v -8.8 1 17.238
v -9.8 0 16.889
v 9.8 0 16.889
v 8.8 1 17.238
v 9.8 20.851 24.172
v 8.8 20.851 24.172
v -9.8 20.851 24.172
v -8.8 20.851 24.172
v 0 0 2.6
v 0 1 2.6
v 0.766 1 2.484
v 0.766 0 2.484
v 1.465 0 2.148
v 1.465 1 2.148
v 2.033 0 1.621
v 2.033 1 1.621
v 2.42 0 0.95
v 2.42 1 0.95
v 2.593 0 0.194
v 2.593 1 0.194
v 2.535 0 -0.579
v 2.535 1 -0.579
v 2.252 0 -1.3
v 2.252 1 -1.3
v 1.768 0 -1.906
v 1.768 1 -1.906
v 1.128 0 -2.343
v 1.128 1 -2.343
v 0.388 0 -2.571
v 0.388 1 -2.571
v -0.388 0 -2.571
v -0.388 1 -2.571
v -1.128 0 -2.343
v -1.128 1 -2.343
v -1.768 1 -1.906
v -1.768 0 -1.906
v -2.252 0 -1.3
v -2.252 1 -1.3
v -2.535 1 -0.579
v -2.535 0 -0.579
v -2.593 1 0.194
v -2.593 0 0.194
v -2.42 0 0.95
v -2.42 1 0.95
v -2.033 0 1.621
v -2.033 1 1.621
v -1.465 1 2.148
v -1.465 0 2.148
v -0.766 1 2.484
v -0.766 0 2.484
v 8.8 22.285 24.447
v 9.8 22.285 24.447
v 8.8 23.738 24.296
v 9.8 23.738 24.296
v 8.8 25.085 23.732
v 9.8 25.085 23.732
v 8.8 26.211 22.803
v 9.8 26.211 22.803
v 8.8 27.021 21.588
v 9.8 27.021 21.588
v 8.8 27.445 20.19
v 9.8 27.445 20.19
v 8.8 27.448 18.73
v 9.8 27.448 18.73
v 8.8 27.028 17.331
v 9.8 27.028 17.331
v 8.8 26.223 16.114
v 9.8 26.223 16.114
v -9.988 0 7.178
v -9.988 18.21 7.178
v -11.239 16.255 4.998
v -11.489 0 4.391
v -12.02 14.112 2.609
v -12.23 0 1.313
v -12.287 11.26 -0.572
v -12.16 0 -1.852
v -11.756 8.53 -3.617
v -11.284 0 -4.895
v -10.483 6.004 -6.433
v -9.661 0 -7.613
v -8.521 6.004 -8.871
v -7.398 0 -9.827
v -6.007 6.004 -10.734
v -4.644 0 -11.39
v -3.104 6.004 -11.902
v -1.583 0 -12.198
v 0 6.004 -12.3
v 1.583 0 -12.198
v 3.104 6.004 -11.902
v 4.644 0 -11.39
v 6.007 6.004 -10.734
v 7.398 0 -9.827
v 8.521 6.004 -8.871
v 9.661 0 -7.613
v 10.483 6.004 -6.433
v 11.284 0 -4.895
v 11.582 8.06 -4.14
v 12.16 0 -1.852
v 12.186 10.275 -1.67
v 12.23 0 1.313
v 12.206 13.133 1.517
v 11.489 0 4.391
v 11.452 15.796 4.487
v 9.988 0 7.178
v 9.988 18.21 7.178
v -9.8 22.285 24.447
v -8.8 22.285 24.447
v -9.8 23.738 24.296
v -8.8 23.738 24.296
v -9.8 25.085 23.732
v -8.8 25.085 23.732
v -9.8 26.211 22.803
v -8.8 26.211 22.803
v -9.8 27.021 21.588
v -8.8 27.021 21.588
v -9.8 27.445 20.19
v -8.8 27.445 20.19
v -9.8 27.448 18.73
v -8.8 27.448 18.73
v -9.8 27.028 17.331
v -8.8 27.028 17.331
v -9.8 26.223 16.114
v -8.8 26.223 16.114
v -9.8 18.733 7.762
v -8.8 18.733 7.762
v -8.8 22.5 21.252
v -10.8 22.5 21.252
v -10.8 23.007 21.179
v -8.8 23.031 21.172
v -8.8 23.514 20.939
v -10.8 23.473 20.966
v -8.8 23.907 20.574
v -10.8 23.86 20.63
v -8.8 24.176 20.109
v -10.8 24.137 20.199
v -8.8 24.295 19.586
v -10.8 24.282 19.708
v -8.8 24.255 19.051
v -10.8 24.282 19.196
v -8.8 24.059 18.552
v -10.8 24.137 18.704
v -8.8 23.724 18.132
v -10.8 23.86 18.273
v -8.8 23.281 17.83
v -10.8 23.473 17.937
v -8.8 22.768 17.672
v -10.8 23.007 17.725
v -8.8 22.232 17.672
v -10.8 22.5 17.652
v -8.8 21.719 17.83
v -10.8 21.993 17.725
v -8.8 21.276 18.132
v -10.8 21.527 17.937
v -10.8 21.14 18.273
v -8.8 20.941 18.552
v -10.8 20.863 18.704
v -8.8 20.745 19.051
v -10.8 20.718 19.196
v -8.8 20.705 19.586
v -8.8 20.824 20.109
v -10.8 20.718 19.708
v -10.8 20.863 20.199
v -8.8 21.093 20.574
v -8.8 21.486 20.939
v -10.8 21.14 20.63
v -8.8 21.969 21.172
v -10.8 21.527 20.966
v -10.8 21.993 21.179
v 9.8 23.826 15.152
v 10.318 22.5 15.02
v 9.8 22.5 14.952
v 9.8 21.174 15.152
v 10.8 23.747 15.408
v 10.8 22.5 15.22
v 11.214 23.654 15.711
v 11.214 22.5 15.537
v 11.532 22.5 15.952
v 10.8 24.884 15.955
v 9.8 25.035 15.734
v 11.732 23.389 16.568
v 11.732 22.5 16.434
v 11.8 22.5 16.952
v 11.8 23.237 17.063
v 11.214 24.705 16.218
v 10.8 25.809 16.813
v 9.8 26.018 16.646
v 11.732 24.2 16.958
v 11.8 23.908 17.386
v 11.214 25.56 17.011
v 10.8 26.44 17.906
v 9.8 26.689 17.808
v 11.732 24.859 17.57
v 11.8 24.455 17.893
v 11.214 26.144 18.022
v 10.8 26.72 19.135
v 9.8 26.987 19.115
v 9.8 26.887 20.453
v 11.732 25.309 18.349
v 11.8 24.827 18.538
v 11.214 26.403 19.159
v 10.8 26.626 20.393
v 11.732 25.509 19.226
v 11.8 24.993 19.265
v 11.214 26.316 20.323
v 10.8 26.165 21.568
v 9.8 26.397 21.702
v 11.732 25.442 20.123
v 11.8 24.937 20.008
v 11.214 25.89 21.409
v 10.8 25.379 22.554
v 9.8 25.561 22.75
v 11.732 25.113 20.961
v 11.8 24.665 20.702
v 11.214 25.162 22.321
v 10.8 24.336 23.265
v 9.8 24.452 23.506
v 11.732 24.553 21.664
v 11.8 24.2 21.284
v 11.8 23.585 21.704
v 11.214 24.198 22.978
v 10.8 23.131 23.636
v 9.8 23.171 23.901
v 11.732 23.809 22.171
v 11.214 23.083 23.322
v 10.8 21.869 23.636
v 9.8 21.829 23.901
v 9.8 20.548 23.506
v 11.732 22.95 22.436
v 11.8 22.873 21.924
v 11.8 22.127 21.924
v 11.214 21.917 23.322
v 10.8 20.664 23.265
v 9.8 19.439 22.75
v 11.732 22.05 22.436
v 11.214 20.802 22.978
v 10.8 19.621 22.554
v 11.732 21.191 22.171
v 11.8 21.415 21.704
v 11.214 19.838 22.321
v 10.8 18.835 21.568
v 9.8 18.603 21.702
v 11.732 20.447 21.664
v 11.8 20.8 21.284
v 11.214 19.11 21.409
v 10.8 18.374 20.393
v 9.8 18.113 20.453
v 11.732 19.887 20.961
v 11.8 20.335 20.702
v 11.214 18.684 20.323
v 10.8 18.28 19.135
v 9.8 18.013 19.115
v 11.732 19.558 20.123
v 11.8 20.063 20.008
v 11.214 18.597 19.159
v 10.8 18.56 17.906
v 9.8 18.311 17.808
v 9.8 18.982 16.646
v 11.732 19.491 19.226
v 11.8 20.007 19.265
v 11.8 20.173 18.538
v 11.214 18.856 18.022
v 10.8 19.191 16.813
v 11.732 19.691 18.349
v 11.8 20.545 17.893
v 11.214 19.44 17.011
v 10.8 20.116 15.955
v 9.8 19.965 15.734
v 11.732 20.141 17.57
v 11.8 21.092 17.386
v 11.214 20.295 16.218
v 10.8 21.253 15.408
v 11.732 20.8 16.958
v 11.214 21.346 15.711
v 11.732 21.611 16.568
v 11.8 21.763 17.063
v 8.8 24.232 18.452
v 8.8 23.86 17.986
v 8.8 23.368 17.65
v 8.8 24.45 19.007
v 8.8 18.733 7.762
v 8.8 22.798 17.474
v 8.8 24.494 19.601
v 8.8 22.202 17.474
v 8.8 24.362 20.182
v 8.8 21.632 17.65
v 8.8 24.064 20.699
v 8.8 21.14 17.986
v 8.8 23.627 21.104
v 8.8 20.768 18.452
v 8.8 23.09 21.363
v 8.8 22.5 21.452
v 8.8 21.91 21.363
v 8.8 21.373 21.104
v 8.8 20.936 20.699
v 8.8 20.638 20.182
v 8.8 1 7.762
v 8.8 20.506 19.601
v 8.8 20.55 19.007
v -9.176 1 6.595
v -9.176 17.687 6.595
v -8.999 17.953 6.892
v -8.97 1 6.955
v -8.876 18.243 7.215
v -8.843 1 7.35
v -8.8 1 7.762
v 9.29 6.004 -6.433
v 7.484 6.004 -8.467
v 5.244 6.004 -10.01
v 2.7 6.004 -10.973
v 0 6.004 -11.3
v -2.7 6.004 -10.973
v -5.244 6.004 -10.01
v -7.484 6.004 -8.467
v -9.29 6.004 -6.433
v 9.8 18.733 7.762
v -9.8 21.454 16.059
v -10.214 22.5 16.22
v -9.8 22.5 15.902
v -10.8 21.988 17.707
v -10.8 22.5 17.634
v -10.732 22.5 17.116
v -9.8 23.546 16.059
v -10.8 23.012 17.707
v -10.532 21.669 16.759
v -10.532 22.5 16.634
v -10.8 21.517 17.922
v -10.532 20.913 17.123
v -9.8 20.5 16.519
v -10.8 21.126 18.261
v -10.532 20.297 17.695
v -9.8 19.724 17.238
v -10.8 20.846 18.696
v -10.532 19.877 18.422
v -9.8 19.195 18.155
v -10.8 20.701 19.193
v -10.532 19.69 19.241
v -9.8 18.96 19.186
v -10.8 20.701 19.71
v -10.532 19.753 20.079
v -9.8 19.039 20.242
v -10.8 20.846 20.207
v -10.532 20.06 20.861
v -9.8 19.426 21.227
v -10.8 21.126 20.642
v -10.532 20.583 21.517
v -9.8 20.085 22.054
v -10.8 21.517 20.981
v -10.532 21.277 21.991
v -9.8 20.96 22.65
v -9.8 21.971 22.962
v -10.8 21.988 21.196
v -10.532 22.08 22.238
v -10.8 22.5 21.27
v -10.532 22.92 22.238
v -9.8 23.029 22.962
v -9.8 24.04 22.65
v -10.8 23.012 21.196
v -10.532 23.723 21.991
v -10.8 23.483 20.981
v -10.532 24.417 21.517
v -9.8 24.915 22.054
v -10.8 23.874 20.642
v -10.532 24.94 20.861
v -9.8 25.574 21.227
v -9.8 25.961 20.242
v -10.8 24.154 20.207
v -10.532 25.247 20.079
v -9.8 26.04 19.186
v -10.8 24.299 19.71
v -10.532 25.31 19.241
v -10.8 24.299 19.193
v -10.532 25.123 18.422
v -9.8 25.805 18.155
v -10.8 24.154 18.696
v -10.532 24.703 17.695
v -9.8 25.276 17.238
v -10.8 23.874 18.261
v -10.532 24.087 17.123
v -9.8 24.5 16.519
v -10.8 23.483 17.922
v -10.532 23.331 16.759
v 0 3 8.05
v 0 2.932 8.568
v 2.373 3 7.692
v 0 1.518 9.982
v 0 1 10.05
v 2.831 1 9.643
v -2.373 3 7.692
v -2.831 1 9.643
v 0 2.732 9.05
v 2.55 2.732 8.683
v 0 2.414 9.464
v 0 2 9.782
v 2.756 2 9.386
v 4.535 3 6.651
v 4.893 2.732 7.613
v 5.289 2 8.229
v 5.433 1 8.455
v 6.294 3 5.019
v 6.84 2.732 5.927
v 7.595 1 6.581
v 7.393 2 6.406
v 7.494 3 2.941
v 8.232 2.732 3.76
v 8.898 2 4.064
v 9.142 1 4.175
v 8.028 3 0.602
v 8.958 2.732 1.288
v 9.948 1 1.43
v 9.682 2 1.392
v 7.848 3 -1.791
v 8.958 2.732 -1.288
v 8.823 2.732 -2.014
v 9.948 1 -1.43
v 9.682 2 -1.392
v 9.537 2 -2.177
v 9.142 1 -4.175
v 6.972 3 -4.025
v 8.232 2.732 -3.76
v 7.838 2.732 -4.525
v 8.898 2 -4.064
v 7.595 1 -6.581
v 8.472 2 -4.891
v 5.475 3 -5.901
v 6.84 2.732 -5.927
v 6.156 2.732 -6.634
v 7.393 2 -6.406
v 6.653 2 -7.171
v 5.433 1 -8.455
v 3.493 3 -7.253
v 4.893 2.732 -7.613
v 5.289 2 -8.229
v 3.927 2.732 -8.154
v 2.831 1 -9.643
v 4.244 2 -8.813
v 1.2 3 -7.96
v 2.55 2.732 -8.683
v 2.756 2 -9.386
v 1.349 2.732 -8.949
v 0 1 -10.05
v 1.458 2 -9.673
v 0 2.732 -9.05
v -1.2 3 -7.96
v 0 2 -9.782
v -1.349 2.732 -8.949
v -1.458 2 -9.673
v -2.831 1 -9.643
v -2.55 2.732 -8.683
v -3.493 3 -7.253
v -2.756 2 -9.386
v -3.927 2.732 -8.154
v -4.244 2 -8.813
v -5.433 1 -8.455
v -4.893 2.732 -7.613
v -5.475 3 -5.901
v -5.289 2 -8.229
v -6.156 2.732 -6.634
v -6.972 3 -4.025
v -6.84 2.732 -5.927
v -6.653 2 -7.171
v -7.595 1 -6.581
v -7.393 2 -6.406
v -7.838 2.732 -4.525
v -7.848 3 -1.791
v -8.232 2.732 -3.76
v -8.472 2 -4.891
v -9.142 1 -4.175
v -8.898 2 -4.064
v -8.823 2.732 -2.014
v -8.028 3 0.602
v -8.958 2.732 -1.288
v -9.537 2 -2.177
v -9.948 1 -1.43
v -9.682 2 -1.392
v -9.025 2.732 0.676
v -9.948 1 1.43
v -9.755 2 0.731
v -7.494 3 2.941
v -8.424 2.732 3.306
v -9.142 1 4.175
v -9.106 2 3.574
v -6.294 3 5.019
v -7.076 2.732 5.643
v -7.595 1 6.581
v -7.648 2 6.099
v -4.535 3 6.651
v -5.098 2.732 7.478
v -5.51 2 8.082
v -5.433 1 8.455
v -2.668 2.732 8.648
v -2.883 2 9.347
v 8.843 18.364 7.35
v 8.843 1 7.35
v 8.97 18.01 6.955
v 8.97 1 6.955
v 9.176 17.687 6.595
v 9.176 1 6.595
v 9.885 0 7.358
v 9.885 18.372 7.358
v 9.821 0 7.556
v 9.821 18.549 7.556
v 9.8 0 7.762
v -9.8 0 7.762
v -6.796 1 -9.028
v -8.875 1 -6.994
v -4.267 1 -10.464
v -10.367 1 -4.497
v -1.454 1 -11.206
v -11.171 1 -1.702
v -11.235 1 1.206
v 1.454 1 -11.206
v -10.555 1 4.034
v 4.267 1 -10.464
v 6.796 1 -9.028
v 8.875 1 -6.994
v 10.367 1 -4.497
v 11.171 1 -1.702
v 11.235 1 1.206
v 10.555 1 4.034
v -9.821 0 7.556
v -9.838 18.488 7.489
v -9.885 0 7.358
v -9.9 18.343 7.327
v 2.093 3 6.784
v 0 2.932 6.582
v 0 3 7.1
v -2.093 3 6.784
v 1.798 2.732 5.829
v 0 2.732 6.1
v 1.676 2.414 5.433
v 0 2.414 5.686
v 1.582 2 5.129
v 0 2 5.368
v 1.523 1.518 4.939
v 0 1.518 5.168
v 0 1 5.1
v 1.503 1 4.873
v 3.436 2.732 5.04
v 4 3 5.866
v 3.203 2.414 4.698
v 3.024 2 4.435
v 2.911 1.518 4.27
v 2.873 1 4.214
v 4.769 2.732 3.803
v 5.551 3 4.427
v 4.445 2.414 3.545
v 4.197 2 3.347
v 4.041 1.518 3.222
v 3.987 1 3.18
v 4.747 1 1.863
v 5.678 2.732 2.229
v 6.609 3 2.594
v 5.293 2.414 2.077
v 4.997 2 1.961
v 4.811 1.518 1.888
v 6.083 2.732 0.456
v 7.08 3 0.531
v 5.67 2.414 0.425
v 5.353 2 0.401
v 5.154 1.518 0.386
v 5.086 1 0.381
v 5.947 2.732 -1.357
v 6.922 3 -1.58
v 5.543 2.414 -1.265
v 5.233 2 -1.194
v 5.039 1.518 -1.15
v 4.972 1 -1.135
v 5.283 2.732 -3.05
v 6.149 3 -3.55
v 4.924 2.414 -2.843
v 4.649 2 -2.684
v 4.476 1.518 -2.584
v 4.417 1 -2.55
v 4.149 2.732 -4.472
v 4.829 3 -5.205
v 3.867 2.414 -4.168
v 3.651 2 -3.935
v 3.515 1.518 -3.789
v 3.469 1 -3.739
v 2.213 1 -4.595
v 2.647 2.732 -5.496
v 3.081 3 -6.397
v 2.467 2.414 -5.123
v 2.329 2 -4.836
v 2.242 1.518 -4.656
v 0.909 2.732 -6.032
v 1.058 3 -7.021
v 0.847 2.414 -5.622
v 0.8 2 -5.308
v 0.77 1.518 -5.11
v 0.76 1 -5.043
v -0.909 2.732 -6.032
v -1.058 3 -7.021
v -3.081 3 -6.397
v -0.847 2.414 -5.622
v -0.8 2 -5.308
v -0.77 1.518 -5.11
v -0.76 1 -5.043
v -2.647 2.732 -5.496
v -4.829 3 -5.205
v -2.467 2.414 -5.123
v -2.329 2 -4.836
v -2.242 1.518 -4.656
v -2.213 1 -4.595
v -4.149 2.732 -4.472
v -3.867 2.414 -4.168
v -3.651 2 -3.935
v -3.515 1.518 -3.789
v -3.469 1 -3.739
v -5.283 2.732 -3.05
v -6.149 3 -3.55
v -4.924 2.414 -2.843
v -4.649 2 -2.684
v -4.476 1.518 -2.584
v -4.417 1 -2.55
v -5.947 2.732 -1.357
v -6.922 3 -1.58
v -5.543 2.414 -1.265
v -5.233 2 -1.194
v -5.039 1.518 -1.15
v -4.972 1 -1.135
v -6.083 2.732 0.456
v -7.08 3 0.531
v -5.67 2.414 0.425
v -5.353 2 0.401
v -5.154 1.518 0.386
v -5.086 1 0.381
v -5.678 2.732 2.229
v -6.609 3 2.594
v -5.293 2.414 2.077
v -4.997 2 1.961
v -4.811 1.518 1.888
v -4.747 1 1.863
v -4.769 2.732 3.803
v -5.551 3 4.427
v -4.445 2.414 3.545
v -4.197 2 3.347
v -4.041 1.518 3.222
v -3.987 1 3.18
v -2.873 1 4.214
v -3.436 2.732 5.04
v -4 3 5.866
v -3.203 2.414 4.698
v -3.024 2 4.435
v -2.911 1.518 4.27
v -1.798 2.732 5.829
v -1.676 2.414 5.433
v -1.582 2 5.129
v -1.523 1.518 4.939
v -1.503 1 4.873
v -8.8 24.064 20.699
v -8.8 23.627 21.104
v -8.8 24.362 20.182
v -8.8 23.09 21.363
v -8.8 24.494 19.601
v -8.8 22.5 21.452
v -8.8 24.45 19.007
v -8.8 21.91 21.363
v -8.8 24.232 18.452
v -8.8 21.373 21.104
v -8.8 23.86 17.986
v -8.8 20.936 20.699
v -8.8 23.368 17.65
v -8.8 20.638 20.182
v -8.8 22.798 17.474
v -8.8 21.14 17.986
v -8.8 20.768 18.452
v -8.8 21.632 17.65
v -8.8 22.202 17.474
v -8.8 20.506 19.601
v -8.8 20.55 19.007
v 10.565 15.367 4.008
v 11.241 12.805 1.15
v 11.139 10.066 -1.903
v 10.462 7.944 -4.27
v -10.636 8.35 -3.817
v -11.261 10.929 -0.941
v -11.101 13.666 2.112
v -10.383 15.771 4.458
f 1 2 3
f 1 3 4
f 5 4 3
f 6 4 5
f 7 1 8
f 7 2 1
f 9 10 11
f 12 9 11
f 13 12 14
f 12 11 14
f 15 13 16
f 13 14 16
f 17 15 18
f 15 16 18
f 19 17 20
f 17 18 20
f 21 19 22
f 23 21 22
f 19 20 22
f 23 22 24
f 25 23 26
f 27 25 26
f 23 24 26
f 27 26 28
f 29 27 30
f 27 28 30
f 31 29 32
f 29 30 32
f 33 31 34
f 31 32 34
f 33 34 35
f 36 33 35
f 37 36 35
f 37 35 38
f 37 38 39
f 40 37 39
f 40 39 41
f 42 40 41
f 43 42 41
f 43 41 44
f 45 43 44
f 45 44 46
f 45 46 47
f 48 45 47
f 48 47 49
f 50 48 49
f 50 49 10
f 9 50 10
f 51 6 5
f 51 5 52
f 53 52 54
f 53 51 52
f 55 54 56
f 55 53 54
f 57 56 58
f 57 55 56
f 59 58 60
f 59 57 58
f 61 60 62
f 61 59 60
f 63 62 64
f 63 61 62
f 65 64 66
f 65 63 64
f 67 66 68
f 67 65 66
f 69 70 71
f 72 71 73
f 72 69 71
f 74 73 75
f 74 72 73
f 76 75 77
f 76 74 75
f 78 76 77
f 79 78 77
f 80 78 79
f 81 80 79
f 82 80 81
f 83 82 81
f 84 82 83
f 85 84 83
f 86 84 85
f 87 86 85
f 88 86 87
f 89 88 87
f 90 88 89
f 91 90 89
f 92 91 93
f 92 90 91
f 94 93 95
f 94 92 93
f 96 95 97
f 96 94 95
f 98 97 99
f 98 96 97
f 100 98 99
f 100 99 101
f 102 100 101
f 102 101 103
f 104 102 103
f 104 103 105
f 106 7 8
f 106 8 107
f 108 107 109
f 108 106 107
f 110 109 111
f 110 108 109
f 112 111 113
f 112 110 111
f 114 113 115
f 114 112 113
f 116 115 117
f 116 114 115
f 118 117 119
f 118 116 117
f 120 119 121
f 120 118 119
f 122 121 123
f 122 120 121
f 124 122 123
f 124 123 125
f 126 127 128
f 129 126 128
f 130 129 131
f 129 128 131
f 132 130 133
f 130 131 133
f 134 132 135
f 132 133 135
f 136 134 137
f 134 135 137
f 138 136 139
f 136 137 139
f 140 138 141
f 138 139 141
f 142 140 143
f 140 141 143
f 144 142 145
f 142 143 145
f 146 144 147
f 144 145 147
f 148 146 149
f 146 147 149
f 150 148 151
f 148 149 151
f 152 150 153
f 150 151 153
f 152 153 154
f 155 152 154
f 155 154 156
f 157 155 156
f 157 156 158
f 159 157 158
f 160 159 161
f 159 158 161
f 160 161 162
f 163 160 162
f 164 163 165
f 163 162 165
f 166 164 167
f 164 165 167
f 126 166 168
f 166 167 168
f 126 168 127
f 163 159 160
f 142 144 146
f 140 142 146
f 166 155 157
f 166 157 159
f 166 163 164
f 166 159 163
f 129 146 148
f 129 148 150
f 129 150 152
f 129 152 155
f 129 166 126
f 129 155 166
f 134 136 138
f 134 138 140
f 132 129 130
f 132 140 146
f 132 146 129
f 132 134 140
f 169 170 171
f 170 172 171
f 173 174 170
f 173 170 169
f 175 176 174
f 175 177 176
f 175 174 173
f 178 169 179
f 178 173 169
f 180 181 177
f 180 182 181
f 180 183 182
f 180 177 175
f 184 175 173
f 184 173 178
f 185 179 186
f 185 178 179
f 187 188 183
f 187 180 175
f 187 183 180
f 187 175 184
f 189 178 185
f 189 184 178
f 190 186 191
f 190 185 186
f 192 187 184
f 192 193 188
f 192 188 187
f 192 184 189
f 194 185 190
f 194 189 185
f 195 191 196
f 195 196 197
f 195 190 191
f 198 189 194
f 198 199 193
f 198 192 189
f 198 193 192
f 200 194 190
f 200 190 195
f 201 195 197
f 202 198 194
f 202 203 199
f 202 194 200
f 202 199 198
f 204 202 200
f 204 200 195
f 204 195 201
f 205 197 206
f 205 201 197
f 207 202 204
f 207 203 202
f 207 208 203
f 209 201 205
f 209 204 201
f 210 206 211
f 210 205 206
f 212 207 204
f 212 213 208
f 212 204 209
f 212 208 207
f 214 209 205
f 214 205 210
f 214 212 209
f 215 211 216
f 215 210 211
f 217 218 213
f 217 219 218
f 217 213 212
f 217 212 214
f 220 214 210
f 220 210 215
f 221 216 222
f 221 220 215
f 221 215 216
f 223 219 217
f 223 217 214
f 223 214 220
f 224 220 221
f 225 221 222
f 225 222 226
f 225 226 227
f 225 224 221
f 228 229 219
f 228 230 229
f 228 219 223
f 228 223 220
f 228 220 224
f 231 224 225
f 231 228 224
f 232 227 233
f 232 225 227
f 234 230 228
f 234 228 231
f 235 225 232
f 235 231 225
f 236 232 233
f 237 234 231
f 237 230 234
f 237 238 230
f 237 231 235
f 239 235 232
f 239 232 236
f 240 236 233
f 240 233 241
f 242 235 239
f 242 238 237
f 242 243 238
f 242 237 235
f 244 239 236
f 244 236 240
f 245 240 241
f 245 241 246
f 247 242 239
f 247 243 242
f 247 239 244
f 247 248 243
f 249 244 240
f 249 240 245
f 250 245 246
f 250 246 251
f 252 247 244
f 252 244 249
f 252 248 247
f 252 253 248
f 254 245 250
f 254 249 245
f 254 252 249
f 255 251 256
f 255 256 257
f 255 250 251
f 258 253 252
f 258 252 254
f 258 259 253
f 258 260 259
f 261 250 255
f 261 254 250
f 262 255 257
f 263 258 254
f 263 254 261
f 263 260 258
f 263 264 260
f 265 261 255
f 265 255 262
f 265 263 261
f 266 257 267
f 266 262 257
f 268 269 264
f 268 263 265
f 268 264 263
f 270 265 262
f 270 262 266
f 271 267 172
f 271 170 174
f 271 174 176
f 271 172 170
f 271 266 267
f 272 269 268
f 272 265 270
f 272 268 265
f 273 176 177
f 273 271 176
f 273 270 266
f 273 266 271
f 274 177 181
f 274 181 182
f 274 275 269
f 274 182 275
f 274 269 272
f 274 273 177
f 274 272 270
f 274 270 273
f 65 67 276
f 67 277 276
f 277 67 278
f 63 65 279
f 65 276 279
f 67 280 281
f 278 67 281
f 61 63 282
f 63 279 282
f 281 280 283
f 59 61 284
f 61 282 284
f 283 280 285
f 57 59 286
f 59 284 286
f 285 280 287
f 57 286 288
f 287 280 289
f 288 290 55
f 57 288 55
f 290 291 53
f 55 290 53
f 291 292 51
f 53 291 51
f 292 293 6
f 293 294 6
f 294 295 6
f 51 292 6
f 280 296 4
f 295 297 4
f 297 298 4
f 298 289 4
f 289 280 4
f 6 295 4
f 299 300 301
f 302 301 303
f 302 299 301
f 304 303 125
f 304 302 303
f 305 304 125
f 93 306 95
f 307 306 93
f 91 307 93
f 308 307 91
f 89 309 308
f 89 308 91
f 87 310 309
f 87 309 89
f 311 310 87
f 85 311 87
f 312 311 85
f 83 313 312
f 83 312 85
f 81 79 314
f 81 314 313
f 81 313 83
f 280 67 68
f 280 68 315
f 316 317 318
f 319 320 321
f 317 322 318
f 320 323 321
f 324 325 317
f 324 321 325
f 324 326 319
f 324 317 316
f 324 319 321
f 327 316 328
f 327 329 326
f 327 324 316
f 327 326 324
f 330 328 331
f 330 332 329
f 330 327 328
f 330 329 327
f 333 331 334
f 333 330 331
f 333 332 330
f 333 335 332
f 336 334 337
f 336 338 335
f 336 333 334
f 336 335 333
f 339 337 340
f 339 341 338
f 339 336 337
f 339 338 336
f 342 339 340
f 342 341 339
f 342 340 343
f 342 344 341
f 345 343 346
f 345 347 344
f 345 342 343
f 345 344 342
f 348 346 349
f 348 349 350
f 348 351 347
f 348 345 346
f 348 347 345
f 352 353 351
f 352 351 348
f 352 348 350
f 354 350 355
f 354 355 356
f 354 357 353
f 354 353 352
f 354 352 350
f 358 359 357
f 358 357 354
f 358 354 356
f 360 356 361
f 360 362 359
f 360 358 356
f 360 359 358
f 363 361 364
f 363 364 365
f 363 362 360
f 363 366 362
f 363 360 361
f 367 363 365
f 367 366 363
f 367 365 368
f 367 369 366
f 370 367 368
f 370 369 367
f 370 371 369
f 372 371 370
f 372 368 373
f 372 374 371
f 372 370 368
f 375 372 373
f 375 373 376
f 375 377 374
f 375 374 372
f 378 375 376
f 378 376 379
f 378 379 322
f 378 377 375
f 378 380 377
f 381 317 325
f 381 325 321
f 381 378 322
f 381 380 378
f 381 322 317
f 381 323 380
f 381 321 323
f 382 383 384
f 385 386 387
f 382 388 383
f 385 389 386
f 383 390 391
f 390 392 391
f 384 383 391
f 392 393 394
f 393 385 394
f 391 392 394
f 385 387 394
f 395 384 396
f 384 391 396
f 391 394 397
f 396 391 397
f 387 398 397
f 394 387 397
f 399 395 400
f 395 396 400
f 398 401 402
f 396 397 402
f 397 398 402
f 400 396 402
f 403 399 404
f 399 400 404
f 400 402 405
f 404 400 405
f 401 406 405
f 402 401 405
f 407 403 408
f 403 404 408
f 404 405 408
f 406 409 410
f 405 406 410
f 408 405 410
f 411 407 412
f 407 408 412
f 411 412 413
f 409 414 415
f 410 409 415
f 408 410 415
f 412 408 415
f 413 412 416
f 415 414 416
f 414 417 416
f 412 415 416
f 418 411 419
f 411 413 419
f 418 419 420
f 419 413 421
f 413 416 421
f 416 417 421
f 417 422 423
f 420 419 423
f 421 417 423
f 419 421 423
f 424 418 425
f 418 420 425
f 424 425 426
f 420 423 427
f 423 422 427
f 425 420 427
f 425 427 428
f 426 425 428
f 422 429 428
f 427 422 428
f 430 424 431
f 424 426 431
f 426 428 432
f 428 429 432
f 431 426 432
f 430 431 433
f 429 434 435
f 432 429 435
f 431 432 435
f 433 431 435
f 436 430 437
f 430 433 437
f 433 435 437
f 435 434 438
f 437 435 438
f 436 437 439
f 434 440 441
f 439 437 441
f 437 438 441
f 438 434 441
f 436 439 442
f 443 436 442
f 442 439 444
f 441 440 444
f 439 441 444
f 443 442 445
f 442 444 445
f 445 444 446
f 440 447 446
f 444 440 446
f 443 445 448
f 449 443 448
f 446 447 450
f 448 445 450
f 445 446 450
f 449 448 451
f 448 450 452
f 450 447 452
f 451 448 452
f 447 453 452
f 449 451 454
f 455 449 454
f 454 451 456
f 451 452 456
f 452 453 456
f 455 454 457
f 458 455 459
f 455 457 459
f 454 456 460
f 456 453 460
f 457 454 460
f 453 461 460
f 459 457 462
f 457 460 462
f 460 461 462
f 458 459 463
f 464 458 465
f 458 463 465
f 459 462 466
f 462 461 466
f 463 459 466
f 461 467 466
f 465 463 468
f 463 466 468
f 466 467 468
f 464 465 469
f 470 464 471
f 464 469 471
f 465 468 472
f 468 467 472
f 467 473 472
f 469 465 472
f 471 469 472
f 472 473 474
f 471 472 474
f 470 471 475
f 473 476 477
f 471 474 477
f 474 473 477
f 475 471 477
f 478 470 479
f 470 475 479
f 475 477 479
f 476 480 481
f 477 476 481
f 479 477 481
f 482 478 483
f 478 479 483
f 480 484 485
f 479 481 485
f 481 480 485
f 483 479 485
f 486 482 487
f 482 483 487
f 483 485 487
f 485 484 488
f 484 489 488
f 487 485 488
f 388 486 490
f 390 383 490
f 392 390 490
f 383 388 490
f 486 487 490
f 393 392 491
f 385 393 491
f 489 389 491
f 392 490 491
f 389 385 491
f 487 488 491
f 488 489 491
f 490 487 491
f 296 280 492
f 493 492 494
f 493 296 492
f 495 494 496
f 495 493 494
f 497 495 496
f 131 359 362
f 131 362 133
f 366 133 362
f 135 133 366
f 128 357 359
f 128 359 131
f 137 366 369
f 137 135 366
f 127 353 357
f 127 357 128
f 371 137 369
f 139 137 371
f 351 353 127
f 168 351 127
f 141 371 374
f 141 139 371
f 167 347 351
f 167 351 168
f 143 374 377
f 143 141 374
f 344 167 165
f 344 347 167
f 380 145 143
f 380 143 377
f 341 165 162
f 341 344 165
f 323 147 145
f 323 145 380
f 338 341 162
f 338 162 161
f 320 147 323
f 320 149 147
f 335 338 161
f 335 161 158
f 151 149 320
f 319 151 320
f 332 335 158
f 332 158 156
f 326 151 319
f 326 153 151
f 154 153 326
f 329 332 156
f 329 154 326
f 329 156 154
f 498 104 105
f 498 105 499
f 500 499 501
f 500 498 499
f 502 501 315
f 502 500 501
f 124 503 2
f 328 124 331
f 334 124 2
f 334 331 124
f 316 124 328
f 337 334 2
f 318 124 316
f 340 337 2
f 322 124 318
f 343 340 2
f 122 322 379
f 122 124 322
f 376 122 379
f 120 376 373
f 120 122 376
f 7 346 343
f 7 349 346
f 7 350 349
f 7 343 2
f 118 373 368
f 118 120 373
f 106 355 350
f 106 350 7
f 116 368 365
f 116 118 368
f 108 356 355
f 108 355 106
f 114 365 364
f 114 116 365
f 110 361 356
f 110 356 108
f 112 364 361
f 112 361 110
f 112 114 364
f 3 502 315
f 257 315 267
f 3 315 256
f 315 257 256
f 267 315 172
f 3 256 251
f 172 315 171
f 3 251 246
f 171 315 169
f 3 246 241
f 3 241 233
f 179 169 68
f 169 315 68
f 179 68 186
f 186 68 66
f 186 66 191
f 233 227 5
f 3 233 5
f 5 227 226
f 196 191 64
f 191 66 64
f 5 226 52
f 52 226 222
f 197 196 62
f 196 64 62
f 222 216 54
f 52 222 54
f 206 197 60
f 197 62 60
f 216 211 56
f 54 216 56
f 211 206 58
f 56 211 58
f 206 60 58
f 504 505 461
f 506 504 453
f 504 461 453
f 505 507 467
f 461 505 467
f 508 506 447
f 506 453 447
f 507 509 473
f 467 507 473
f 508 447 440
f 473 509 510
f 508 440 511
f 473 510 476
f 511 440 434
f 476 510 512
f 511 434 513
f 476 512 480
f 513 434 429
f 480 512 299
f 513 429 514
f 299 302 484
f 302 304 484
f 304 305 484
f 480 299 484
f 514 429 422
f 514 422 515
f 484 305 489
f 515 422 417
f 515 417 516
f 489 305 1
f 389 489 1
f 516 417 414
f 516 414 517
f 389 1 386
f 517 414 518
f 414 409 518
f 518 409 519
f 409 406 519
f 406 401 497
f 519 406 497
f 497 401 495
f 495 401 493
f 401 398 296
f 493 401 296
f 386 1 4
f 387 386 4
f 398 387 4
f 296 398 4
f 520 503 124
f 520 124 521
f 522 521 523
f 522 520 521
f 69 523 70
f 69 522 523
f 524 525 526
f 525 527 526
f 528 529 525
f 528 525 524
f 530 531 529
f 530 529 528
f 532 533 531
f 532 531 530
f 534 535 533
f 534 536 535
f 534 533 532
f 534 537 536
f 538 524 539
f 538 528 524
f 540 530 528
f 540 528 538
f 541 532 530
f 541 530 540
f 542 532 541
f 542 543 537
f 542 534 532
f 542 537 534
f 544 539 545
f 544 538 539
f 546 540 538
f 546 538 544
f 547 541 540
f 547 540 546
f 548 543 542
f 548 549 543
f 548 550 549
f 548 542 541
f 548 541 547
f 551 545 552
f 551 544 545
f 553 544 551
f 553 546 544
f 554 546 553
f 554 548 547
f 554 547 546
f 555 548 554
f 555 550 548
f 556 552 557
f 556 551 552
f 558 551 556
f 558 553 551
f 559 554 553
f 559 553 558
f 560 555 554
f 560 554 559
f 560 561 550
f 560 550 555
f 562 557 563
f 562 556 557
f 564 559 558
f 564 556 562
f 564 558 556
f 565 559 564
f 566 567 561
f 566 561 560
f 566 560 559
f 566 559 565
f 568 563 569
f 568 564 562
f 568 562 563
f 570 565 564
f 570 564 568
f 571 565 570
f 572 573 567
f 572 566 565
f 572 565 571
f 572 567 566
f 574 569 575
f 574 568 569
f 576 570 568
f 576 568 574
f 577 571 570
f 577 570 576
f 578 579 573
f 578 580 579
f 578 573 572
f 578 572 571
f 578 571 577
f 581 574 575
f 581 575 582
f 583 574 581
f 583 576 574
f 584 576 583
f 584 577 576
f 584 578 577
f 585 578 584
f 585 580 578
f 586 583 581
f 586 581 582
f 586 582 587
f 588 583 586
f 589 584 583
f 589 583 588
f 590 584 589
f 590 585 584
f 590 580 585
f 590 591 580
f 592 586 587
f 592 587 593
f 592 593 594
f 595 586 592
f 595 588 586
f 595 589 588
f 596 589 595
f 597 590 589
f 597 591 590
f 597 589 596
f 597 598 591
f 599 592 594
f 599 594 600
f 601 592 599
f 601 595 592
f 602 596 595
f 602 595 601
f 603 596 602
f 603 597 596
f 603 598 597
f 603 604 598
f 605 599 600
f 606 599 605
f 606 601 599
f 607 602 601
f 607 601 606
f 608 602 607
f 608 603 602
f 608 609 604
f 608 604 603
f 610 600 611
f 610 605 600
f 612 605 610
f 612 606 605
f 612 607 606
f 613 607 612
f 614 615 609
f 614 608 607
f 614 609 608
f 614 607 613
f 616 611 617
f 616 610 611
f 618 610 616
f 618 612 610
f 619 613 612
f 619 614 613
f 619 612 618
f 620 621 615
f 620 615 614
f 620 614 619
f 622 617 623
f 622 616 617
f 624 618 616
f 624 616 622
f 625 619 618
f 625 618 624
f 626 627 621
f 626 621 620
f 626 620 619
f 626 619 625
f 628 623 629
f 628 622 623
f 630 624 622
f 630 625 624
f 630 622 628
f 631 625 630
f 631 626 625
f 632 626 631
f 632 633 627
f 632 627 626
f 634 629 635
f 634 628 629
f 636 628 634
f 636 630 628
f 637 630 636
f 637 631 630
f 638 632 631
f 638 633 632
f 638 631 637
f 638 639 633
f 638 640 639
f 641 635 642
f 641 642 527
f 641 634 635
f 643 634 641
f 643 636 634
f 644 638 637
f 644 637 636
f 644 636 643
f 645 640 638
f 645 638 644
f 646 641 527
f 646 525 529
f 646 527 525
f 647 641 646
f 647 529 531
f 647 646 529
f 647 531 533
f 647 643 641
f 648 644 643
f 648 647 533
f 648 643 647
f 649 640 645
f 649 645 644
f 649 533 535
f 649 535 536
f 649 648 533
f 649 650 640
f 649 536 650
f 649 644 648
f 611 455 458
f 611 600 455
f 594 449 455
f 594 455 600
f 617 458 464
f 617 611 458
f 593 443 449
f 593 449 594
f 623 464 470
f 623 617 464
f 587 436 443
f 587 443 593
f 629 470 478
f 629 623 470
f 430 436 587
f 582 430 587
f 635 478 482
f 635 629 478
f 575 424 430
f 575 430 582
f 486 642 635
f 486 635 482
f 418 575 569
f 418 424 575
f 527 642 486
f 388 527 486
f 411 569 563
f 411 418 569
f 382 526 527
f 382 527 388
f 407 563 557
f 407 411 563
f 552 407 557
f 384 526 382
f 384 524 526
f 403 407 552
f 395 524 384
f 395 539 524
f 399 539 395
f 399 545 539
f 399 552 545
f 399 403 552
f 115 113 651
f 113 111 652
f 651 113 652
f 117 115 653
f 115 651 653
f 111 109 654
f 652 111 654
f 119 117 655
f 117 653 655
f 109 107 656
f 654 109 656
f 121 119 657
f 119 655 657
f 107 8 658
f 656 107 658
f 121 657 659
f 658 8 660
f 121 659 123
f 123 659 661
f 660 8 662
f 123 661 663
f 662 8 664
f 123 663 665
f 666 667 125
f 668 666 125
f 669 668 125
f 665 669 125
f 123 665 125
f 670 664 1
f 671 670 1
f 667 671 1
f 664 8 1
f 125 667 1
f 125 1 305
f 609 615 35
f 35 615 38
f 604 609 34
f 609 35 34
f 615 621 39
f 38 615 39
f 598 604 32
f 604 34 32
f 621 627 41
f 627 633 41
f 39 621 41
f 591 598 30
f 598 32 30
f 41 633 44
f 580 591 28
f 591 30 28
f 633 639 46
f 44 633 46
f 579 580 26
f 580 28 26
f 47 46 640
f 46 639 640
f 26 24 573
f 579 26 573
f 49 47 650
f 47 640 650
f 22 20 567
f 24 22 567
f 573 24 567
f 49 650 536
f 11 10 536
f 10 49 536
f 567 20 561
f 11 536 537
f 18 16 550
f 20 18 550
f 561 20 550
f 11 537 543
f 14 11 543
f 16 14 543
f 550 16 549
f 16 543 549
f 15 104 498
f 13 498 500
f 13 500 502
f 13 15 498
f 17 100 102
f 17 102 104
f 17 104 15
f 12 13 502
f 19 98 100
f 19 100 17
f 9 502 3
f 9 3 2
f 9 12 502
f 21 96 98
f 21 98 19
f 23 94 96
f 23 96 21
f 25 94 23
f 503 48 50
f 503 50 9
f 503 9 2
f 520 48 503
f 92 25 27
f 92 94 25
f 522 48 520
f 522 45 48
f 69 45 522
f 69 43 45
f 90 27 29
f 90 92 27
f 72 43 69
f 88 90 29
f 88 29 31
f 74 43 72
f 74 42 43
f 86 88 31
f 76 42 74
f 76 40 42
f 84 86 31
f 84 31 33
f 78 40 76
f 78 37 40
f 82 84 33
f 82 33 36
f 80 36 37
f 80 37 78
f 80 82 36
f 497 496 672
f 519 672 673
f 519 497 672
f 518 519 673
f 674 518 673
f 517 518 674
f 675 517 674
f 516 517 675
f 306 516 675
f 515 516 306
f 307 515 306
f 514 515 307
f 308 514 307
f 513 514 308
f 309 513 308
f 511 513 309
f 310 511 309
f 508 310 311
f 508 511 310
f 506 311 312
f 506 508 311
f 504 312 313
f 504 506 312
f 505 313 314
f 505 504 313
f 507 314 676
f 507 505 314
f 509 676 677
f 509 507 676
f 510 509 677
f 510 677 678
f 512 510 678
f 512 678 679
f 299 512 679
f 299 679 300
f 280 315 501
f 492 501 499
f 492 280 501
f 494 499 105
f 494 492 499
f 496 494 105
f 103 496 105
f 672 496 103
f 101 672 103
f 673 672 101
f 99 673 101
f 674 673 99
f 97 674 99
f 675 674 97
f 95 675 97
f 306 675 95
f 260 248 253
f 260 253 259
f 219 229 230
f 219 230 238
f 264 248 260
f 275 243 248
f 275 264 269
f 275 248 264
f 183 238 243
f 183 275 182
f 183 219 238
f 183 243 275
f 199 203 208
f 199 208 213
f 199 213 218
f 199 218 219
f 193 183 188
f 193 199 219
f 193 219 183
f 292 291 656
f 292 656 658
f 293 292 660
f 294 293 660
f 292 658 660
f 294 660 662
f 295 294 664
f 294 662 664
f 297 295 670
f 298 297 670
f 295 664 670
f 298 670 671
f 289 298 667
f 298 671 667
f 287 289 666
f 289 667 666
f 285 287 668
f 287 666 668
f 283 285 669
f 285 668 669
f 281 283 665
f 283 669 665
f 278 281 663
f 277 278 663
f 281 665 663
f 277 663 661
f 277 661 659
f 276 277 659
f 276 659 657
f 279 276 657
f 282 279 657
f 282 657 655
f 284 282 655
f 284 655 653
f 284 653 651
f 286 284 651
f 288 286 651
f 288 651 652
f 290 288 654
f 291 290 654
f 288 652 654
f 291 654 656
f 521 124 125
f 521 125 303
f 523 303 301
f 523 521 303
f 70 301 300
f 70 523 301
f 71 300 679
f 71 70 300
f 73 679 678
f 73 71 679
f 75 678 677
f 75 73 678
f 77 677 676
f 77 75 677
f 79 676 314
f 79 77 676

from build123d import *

# Parameters (mm, degrees)
BOSS_EXTRUDE3_DEPTH     = 1
BOSS_EXTRUDE4_DEPTH     = 19.6
CUT_EXTRUDE3_START      = -1
CUT_EXTRUDE3_DEPTH      = 38.799803657
BOSS_EXTRUDE5_DEPTH     = 30
CUT_EXTRUDE4_DEPTH      = 42.354259319
CUT_EXTRUDE4_DEPTH_BACK = 42.354259319
SKETCH9_R               = 2
BOSS_EXTRUDE6_DEPTH     = 17.6
SKETCH10_R              = 3.55
BOSS_EXTRUDE7_DEPTH     = 1
SKETCH11_R              = 1.8
CUT_EXTRUDE5_DEPTH      = 2
SKETCH12_R              = 4.5
BOSS_EXTRUDE8_DEPTH     = 2
SKETCH13_R              = 10.05
SKETCH13_R_2            = 5.1
BOSS_EXTRUDE9_DEPTH     = 2
SKETCH14_R              = 2.6
CUT_EXTRUDE6_DEPTH      = 39.097569002
FILLET2_R               = 2
FILLET3_R               = 2
FILLET4_R               = 2
FILLET5_R               = 2


# Some blends are built 0.0001 mm under size
with BuildPart() as part:
    # Sketch1 → Boss-Extrude3 (new body)
    # profile 1 of 2: a face of its own
    with BuildSketch(Plane(origin=(0, 0, 0), x_dir=(1, 0, 0), z_dir=(0, 1, 0))):
        with BuildLine():
            Line((9.8, -7.762087348), (9.8, -16.888723439))
            Line((9.8, -16.888723439), (-9.8, -16.888723439))
            Line((-9.8, -16.888723439), (-9.8, -7.762087348))
            ThreePointArc((-9.8, -7.762087348), (-9.848151778, -7.455517678), (-9.987969925, -7.178471758))
            ThreePointArc((-9.987969925, -7.178471758), (0, 12.3), (9.987969925, -7.178471758))
            ThreePointArc((9.987969925, -7.178471758), (9.848151778, -7.455517678), (9.8, -7.762087348))
        make_face()
        with BuildLine():
            ThreePointArc((8.8, -7.762087348), (8.896303556, -7.148948009), (9.17593985, -6.594856168))
            ThreePointArc((9.17593985, -6.594856168), (0, 11.3), (-9.17593985, -6.594856168))
            ThreePointArc((-9.17593985, -6.594856168), (-8.896303556, -7.148948009), (-8.8, -7.762087348))
            Line((-8.8, -7.762087348), (-8.8, -15.888723439))
            Line((-8.8, -15.888723439), (8.8, -15.888723439))
            Line((8.8, -15.888723439), (8.8, -7.762087348))
        make_face(mode=Mode.SUBTRACT)
    # profile 2 of 2: a face of its own
    with BuildSketch(Plane(origin=(0, 0, 0), x_dir=(1, 0, 0), z_dir=(0, 1, 0))):
        with BuildLine():
            Line((8.8, -7.762087348), (8.8, -15.888723439))
            Line((8.8, -15.888723439), (-8.8, -15.888723439))
            Line((-8.8, -15.888723439), (-8.8, -7.762087348))
            ThreePointArc((-8.8, -7.762087348), (-8.896303556, -7.148948009), (-9.17593985, -6.594856168))
            ThreePointArc((-9.17593985, -6.594856168), (0, 11.3), (9.17593985, -6.594856168))
            ThreePointArc((9.17593985, -6.594856168), (8.896303556, -7.148948009), (8.8, -7.762087348))
        make_face()
    extrude(amount=BOSS_EXTRUDE3_DEPTH)

    # Sketch2 → Boss-Extrude4 (add)
    with BuildSketch(Plane.ZY.offset(9.8)):
        with BuildLine():
            Line((16.888723439, 0), (24.17200628, 20.851200177))
            ThreePointArc((24.17200628, 20.851200177), (22.22483795, 26.660481625), (16.113586017, 26.22251443))
            Line((16.113586017, 26.22251443), (7.762087348, 18.73346191))
            Line((7.762087348, 18.73346191), (7.762087348, 0))
            Line((7.762087348, 0), (16.888723439, 0))
        make_face()
    extrude(amount=-BOSS_EXTRUDE4_DEPTH)

    # Sketch4 → Cut-Extrude3 (cut, through all)
    with BuildSketch(Plane.XZ.offset(CUT_EXTRUDE3_START)):
        Polygon((8.8, 7.762087348), (8.8, 15.888723439), (8.8, 29.007134954), (-8.8, 29.007134954), (-8.8, 15.888723439), (-8.8, 7.762087348), align=None)
    extrude(amount=-CUT_EXTRUDE3_DEPTH, mode=Mode.SUBTRACT)

    # Sketch5 → Boss-Extrude5 (add)
    with BuildSketch(Plane(origin=(0, 1, 0), x_dir=(1, 0, 0), z_dir=(0, 1, 0))):
        with BuildLine():
            Line((-8.8, -7.762087348), (-9.8, -7.762087348))
            ThreePointArc((-9.8, -7.762087348), (-9.848151778, -7.455517678), (-9.987969925, -7.178471758))
            ThreePointArc((-9.987969925, -7.178471758), (0, 12.3), (9.987969925, -7.178471758))
            ThreePointArc((9.987969925, -7.178471758), (9.848151778, -7.455517678), (9.8, -7.762087348))
            Line((9.8, -7.762087348), (8.8, -7.762087348))
            ThreePointArc((8.8, -7.762087348), (8.896303556, -7.148948009), (9.17593985, -6.594856168))
            ThreePointArc((9.17593985, -6.594856168), (0, 11.3), (-9.17593985, -6.594856168))
            ThreePointArc((-9.17593985, -6.594856168), (-8.896303556, -7.148948009), (-8.8, -7.762087348))
        make_face()
    extrude(amount=BOSS_EXTRUDE5_DEPTH)

    # Sketch7 → Cut-Extrude4 (cut, two sides: drawn at the far end of the back side and taken through both)
    with BuildSketch(Plane(origin=(0, 0, 0), x_dir=(0, 0, -1), z_dir=(1, 0, 0)).offset(-CUT_EXTRUDE4_DEPTH_BACK)):
        Polygon((15.143665649, 54.023758671), (-16.113586017, 54.023758671), (-16.113586017, 26.22251443), (-7.762087348, 18.73346191), (6.433392437, 6.003927025), (15.143665649, 6.003927025), align=None)
    extrude(amount=CUT_EXTRUDE4_DEPTH + CUT_EXTRUDE4_DEPTH_BACK, mode=Mode.SUBTRACT)

    # Sketch9 → Boss-Extrude6 (add)
    with BuildSketch(Plane(origin=(-8.8, 0, 0), x_dir=(0, 0, -1), z_dir=(1, 0, 0))):
        with Locations(Location((-19.451682229, 22.5, 0), (0, 0, 180))):
            Circle(SKETCH9_R)
    extrude(amount=BOSS_EXTRUDE6_DEPTH)

    # Sketch10 → Boss-Extrude7 (add)
    with BuildSketch(Plane.ZY.offset(9.8)):
        with Locations(Location((19.451682229, 22.5, 0), (0, 0, 180))):
            Circle(SKETCH10_R)
    extrude(amount=BOSS_EXTRUDE7_DEPTH)

    # Sketch11 → Cut-Extrude5 (cut)
    with BuildSketch(Plane.ZY.offset(10.8)):
        with Locations((19.451682229, 22.5)):
            Circle(SKETCH11_R)
    extrude(amount=-CUT_EXTRUDE5_DEPTH, mode=Mode.SUBTRACT)

    # Sketch12 → Boss-Extrude8 (add)
    with BuildSketch(Plane(origin=(9.8, 0, 0), x_dir=(0, 0, -1), z_dir=(1, 0, 0))):
        with Locations((-19.451682229, 22.5)):
            Circle(SKETCH12_R)
    extrude(amount=BOSS_EXTRUDE8_DEPTH)

    # Sketch13 → Boss-Extrude9 (add)
    with BuildSketch(Plane(origin=(0, 1, 0), x_dir=(1, 0, 0), z_dir=(0, 1, 0))):
        with Locations(Location((0, 0, 0), (0, 0, 270))):
            Circle(SKETCH13_R)
        with Locations(Location((0, 0, 0), (0, 0, 270))):
            Circle(SKETCH13_R_2, mode=Mode.SUBTRACT)
    extrude(amount=BOSS_EXTRUDE9_DEPTH)

    # Sketch14 → Cut-Extrude6 (cut, through all)
    with BuildSketch(Plane(origin=(0, 1, 0), x_dir=(1, 0, 0), z_dir=(0, 1, 0))):
        with Locations(Location((0, 0, 0), (0, 0, 270))):
            Circle(SKETCH14_R)
    extrude(amount=-CUT_EXTRUDE6_DEPTH, mode=Mode.SUBTRACT)

    # Fillet2
    fillet2_edges = [part.edges().sort_by_distance(p)[0] for p in [
        (0, 3, -5.1),
    ]]
    fillet(fillet2_edges, radius=FILLET2_R - 0.0001)  # a hair under: the kernel refuses the full size

    # Fillet3
    fillet3_edges = [part.edges().sort_by_distance(p)[0] for p in [
        (0, 3, -10.05),
    ]]
    fillet(fillet3_edges, radius=FILLET3_R - 0.0001)  # a hair under: the kernel refuses the full size

    # Fillet4
    # the kernel refuses this fillet: 2 mm, written as the material it takes off along each edge
    with BuildSketch(Plane(origin=(-10.8, 22.5, 19.451682229), x_dir=(0, 0, -1), z_dir=(0, 1, 0))) as fillet4_piece_1:
        with BuildLine():
            CenterArc((1.817949192, -2), FILLET4_R, 30, 60)
            Line((1.817949192, 0), (1.817949192, 0.04))
            Line((1.817949192, 0.04), (3.55, 0.04))
            Line((3.55, 0.04), (3.59, 0))
            ThreePointArc((3.59, 0), (3.59, -0.5), (3.584641016, -0.98))
            Line((3.584641016, -0.98), (3.55, -1))
        make_face()
    revolve(axis=Axis((-10.8, 22.5, 19.451682229), (-1, 0, 0)), mode=Mode.SUBTRACT)

    # Fillet5
    fillet5_edges = [part.edges().sort_by_distance(p)[0] for p in [
        (11.8, 22.5, 23.951682229),
    ]]
    fillet(fillet5_edges, radius=FILLET5_R - 0.0001)  # a hair under: the kernel refuses the full size


solid = part.part
